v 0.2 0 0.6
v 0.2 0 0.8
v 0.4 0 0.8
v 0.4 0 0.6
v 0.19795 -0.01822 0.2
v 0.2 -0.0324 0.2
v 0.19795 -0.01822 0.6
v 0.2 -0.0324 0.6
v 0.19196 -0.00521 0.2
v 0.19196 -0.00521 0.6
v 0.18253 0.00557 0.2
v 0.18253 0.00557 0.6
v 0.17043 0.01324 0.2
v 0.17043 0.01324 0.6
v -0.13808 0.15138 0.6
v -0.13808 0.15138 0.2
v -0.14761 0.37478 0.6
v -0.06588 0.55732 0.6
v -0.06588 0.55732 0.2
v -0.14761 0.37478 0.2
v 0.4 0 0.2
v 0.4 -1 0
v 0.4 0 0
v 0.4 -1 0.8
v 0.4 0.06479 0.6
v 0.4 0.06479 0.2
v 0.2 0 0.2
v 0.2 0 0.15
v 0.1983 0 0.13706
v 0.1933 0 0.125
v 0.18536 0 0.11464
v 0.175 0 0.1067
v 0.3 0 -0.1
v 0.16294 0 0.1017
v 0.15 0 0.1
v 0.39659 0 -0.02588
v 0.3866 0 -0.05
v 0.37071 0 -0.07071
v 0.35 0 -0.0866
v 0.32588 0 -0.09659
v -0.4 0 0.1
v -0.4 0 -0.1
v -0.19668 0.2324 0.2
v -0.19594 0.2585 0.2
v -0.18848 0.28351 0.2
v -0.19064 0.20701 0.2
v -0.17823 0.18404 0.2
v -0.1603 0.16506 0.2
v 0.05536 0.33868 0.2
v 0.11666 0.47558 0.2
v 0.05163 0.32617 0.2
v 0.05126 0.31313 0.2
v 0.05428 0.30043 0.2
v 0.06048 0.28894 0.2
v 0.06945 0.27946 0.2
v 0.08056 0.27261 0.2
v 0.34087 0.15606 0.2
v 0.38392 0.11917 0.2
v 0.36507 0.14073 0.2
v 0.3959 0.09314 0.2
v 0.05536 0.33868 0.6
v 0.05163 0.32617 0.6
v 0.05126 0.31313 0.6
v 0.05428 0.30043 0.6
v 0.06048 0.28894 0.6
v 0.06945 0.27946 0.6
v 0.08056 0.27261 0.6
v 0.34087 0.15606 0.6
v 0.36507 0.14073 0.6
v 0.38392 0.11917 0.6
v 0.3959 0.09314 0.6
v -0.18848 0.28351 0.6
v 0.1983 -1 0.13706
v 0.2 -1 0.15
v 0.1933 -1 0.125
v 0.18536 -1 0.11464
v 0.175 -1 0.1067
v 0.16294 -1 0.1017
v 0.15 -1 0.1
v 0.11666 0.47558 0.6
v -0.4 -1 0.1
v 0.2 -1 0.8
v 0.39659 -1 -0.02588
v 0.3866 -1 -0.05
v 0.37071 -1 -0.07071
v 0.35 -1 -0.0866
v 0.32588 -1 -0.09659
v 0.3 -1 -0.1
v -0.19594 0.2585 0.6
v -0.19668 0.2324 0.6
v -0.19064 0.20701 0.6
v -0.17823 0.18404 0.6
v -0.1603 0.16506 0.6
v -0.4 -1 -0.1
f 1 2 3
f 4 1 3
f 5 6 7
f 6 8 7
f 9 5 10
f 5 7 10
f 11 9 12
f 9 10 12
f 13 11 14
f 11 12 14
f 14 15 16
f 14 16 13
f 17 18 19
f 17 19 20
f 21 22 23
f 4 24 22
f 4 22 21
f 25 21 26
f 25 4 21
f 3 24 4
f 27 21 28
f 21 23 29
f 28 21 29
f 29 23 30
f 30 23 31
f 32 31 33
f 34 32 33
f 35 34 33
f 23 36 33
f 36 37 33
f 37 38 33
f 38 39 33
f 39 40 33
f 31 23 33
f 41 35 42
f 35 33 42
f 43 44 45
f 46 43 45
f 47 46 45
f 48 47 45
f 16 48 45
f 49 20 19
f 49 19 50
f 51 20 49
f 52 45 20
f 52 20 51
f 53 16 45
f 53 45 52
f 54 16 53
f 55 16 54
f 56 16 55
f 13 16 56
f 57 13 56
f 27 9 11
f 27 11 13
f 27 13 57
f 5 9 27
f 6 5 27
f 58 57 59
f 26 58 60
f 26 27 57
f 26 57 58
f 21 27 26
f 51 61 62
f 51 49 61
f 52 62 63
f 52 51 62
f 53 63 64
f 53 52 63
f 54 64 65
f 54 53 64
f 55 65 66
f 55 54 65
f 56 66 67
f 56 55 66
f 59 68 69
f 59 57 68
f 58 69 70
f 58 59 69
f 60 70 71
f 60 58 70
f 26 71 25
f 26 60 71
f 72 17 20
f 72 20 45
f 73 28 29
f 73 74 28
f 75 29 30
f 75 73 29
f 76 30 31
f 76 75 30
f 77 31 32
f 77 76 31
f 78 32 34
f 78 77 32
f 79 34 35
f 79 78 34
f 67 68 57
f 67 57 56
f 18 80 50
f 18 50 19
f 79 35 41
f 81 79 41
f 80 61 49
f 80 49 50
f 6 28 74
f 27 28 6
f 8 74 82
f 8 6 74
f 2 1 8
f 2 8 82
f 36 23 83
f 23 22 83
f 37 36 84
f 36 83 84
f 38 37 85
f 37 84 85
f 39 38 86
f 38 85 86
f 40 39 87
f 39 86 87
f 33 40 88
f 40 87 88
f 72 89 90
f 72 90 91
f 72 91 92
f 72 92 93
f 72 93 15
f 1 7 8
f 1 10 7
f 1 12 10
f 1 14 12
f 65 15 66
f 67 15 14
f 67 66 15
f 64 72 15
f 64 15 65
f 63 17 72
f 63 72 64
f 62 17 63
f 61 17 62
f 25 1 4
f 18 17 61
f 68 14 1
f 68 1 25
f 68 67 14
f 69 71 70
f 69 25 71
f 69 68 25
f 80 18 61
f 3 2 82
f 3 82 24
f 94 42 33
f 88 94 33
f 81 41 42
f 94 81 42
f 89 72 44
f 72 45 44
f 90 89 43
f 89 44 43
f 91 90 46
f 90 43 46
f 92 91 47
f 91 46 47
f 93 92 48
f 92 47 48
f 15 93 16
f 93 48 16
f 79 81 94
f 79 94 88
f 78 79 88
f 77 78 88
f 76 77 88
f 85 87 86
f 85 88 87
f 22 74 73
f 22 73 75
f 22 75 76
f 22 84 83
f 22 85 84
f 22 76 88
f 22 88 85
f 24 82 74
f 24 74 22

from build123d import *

# Parameters (mm, degrees)
F0_W     = 0.2
F0_H     = 0.7
F1_DEPTH = 1
F3_DEPTH = 0.9
F5_DEPTH = 0.2
F7_DEPTH = 0.3
F8_R     = 0.05
F9_R     = 0.1


with BuildPart() as f1:
    # F0 (on Front) → F1 (new body)
    with BuildSketch(Plane.XZ):
        Polygon((0.2, 0.1), (-0.4, 0.1), (-0.4, -0.1), (0.4, -0.1), (0.4, 0.1), align=None)
        with Locations((0.3, 0.45)):
            Rectangle(F0_W, F0_H)
    extrude(amount=F1_DEPTH)

    # F2 (on face) → F3 (join)
    with BuildSketch(Plane.XY.offset(0.8)):
        Polygon((-0.0658778079, 0.5573172671), (-0.1476107508, 0.3747803502), (0.0349261661, 0.2930474073), (0.116659109, 0.4755843242), align=None)
        Polygon((-0.2293436937, 0.1922434332), (0.2, 0), (0.4, 0), (0.4, 0.1295815215), (0.0349261661, 0.2930474073), (-0.1476107508, 0.3747803502), align=None)
    extrude(amount=-F3_DEPTH)

    # F4 (on face) → F5 (cut)
    with BuildSketch(Plane.XY.offset(0.8)):
        Polygon((0.2, 0), (0.4, 0), (0.4, 0.1295815215), (0.0349261661, 0.2930474073), (0.116659109, 0.4755843242), (-0.0658778079, 0.5573172671), (-0.2293436937, 0.1922434332), align=None)
    extrude(amount=-F5_DEPTH, mode=Mode.SUBTRACT)

    # F6 (on face) → F7 (cut)
    with BuildSketch(Plane(origin=(0, 0, -0.1), x_dir=(1, 0, 0), z_dir=(0, 0, -1))):
        Polygon((0.4, -0.1295815215), (0.4, 0), (0.2, 0), (-0.2293436937, -0.1922434332), (-0.0658778079, -0.5573172671), (0.116659109, -0.4755843242), (0.0349261661, -0.2930474073), align=None)
    extrude(amount=-F7_DEPTH, mode=Mode.SUBTRACT)

    # F8
    f8_edges = [f1.edges().sort_by_distance(p)[0] for p in [
        (0.034926, 0.293047, 0.4),
        (0.2, 0, 0.4),
        (0.2, -0.5, 0.1),
    ]]
    fillet(f8_edges, radius=F8_R)

    # F9
    f9_edges = [f1.edges().sort_by_distance(p)[0] for p in [
        (0.4, -0.5, -0.1),
        (-0.229344, 0.192243, 0.4),
        (0.4, 0.129582, 0.4),
    ]]
    fillet(f9_edges, radius=F9_R)


solid = f1.part
